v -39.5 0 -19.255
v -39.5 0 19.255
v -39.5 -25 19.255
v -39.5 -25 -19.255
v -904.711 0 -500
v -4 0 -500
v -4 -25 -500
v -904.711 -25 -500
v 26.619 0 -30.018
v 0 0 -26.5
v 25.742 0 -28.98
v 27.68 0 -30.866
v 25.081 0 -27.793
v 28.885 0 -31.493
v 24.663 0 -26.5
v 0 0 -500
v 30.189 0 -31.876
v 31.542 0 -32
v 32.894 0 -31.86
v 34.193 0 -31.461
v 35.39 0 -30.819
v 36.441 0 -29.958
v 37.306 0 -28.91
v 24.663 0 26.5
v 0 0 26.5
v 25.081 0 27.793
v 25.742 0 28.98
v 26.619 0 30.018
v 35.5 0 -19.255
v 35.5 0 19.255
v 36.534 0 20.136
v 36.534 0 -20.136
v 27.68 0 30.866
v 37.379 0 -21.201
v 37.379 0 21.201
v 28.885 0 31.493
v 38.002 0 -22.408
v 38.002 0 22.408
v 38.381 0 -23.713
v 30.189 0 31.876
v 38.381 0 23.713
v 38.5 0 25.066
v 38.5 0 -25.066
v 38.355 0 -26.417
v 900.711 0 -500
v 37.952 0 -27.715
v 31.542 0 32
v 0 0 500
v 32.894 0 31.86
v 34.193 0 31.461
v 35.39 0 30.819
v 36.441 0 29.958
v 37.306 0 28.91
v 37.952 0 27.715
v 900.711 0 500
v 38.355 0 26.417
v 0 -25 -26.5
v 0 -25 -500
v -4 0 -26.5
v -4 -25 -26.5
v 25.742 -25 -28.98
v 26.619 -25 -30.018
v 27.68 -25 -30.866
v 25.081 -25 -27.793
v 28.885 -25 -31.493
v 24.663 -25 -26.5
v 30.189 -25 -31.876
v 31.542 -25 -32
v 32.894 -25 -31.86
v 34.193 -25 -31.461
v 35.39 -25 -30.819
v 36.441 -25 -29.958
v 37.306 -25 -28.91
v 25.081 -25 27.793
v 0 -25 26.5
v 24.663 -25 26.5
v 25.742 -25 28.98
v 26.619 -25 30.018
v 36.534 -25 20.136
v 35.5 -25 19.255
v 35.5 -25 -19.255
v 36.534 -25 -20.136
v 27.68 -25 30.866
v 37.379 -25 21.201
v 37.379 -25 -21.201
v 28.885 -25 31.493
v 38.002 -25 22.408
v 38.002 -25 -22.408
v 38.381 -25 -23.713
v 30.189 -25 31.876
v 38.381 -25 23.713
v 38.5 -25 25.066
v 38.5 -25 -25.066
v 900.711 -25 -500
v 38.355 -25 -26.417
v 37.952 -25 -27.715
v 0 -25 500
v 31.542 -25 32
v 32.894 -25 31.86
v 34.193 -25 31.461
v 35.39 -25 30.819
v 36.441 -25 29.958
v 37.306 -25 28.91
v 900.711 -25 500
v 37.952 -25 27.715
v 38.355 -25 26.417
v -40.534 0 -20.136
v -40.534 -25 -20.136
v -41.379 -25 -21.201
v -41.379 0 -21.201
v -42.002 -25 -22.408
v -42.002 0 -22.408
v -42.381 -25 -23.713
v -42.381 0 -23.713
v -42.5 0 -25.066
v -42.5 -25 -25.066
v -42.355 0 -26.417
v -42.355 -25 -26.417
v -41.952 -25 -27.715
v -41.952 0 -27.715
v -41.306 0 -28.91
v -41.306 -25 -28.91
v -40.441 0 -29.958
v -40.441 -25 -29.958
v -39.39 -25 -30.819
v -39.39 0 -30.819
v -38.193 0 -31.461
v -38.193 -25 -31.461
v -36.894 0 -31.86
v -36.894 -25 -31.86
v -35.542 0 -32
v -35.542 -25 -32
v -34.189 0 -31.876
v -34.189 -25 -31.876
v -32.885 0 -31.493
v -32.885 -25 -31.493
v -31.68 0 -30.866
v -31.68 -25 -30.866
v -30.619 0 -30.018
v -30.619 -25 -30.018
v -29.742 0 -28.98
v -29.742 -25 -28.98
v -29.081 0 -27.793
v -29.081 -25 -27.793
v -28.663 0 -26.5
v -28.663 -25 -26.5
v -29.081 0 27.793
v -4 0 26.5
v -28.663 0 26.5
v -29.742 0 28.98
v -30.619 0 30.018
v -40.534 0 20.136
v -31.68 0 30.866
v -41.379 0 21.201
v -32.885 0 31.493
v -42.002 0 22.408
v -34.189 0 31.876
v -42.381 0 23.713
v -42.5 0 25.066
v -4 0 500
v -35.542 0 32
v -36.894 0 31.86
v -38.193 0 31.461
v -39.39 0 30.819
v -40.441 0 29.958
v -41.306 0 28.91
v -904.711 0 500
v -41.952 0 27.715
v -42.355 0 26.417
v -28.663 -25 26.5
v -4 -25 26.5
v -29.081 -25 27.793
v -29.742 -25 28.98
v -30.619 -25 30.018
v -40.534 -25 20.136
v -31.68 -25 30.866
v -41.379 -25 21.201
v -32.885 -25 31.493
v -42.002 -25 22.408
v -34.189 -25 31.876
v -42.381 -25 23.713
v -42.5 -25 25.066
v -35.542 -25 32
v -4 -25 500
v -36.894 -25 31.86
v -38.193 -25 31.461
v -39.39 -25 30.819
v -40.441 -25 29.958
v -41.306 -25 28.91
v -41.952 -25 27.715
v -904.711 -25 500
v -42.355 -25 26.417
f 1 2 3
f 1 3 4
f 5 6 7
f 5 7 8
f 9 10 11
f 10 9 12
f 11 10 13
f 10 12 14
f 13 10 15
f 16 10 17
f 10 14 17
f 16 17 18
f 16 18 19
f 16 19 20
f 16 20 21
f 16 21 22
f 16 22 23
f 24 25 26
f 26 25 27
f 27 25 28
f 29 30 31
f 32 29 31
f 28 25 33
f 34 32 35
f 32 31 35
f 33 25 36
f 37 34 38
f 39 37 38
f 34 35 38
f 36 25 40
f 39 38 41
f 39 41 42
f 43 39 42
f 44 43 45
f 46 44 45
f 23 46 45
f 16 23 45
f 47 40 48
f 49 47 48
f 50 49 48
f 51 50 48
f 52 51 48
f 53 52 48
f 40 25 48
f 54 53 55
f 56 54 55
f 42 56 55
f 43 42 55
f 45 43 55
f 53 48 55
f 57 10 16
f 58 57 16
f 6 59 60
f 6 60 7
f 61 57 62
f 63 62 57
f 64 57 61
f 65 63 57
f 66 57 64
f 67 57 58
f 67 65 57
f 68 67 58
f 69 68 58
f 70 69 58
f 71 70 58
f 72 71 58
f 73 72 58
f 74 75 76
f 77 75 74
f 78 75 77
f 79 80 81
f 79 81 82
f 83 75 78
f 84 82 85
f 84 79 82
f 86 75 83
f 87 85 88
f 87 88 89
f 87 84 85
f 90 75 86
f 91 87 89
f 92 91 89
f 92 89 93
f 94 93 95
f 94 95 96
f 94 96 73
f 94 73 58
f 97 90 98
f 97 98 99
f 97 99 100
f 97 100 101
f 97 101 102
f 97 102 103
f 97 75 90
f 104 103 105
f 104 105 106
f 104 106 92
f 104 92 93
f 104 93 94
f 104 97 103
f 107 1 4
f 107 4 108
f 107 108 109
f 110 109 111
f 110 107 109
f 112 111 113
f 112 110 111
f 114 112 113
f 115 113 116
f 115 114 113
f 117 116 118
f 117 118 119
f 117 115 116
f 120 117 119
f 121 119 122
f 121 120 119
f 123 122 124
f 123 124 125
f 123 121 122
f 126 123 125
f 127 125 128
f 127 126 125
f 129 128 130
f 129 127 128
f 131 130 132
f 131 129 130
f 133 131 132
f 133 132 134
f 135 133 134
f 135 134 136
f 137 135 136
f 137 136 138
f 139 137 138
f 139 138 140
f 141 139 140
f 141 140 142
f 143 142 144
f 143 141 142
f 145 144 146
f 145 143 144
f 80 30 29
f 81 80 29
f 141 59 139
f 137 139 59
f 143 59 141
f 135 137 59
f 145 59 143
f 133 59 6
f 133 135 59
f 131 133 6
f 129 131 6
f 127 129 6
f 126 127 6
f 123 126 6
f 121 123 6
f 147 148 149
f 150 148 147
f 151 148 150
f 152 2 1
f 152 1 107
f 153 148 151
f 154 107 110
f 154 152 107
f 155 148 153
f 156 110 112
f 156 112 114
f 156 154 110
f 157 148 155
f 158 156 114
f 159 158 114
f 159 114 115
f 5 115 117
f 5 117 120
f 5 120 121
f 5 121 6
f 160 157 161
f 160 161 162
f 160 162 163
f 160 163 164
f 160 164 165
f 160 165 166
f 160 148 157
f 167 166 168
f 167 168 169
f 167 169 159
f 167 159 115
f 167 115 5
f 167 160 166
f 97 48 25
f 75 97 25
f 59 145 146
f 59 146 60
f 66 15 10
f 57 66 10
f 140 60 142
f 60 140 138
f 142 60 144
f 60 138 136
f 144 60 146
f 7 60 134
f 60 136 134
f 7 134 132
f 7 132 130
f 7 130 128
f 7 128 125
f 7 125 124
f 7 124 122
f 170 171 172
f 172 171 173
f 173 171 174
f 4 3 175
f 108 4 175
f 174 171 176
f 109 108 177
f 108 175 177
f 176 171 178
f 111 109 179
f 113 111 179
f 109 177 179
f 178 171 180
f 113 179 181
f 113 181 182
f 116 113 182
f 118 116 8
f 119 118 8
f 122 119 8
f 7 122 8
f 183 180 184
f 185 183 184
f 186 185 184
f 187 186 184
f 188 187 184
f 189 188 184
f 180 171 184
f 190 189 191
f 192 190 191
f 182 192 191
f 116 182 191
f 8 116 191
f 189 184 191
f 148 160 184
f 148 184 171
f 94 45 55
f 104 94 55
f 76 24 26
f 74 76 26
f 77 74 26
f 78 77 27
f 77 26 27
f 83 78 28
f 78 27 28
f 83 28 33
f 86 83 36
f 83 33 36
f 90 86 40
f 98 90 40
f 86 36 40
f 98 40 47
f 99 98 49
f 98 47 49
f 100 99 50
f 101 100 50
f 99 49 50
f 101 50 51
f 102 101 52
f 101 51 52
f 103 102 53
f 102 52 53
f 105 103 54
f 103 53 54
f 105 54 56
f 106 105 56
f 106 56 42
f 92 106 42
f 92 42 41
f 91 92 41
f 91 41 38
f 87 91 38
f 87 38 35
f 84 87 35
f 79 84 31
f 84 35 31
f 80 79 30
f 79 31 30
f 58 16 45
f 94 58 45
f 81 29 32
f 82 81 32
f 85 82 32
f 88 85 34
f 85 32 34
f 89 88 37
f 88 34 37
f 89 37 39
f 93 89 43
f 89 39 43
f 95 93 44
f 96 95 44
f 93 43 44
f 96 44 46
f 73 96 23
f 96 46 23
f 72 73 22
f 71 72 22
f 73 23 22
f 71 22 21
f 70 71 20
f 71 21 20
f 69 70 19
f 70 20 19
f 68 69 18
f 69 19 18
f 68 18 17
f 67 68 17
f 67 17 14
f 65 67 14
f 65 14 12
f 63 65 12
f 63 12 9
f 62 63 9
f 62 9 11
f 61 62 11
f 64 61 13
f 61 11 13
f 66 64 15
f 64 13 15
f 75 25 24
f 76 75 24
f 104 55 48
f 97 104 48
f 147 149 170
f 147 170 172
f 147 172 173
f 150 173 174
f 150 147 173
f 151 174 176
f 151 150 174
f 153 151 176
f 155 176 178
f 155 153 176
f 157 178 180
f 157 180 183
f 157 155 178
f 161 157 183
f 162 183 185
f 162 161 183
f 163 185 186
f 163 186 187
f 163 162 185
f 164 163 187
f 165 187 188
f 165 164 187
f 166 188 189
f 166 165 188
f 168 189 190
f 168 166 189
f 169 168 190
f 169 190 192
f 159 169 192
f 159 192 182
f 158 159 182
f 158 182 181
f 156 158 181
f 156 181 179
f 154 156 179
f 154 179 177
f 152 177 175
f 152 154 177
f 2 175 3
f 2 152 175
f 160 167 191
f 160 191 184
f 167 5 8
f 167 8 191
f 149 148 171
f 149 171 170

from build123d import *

# Parameters (mm, degrees)
F1_DEPTH = 25


with BuildPart() as f1:
    # F0 (on Front) → F1 (new body)
    with BuildSketch(Plane.XZ):
        with BuildLine():
            Line((900.710799, 500), (0, 500))
            Line((0, 500), (0, 26.5))
            Line((0, 26.5), (24.662603, 26.5))
            ThreePointArc((24.662603, 26.5), (35.390196, 30.819482), (35.5, 19.255437))
            Line((35.5, 19.255437), (35.5, -19.255437))
            ThreePointArc((35.5, -19.255437), (35.390196, -30.819482), (24.662603, -26.5))
            Line((24.662603, -26.5), (0, -26.5))
            Line((0, -26.5), (0, -500))
            Line((0, -500), (900.710799, -500))
            Line((900.710799, -500), (900.710799, 500))
        make_face()
    extrude(amount=F1_DEPTH)


with BuildPart() as f3_1:
    # F3: instance of F1
    add(f1.part.mirror(Plane(origin=(-2, -12.5, 263.25), x_dir=(0, -1, 0), z_dir=(-1, 0, 0))))


solid = Compound([f1.part, f3_1.part])
